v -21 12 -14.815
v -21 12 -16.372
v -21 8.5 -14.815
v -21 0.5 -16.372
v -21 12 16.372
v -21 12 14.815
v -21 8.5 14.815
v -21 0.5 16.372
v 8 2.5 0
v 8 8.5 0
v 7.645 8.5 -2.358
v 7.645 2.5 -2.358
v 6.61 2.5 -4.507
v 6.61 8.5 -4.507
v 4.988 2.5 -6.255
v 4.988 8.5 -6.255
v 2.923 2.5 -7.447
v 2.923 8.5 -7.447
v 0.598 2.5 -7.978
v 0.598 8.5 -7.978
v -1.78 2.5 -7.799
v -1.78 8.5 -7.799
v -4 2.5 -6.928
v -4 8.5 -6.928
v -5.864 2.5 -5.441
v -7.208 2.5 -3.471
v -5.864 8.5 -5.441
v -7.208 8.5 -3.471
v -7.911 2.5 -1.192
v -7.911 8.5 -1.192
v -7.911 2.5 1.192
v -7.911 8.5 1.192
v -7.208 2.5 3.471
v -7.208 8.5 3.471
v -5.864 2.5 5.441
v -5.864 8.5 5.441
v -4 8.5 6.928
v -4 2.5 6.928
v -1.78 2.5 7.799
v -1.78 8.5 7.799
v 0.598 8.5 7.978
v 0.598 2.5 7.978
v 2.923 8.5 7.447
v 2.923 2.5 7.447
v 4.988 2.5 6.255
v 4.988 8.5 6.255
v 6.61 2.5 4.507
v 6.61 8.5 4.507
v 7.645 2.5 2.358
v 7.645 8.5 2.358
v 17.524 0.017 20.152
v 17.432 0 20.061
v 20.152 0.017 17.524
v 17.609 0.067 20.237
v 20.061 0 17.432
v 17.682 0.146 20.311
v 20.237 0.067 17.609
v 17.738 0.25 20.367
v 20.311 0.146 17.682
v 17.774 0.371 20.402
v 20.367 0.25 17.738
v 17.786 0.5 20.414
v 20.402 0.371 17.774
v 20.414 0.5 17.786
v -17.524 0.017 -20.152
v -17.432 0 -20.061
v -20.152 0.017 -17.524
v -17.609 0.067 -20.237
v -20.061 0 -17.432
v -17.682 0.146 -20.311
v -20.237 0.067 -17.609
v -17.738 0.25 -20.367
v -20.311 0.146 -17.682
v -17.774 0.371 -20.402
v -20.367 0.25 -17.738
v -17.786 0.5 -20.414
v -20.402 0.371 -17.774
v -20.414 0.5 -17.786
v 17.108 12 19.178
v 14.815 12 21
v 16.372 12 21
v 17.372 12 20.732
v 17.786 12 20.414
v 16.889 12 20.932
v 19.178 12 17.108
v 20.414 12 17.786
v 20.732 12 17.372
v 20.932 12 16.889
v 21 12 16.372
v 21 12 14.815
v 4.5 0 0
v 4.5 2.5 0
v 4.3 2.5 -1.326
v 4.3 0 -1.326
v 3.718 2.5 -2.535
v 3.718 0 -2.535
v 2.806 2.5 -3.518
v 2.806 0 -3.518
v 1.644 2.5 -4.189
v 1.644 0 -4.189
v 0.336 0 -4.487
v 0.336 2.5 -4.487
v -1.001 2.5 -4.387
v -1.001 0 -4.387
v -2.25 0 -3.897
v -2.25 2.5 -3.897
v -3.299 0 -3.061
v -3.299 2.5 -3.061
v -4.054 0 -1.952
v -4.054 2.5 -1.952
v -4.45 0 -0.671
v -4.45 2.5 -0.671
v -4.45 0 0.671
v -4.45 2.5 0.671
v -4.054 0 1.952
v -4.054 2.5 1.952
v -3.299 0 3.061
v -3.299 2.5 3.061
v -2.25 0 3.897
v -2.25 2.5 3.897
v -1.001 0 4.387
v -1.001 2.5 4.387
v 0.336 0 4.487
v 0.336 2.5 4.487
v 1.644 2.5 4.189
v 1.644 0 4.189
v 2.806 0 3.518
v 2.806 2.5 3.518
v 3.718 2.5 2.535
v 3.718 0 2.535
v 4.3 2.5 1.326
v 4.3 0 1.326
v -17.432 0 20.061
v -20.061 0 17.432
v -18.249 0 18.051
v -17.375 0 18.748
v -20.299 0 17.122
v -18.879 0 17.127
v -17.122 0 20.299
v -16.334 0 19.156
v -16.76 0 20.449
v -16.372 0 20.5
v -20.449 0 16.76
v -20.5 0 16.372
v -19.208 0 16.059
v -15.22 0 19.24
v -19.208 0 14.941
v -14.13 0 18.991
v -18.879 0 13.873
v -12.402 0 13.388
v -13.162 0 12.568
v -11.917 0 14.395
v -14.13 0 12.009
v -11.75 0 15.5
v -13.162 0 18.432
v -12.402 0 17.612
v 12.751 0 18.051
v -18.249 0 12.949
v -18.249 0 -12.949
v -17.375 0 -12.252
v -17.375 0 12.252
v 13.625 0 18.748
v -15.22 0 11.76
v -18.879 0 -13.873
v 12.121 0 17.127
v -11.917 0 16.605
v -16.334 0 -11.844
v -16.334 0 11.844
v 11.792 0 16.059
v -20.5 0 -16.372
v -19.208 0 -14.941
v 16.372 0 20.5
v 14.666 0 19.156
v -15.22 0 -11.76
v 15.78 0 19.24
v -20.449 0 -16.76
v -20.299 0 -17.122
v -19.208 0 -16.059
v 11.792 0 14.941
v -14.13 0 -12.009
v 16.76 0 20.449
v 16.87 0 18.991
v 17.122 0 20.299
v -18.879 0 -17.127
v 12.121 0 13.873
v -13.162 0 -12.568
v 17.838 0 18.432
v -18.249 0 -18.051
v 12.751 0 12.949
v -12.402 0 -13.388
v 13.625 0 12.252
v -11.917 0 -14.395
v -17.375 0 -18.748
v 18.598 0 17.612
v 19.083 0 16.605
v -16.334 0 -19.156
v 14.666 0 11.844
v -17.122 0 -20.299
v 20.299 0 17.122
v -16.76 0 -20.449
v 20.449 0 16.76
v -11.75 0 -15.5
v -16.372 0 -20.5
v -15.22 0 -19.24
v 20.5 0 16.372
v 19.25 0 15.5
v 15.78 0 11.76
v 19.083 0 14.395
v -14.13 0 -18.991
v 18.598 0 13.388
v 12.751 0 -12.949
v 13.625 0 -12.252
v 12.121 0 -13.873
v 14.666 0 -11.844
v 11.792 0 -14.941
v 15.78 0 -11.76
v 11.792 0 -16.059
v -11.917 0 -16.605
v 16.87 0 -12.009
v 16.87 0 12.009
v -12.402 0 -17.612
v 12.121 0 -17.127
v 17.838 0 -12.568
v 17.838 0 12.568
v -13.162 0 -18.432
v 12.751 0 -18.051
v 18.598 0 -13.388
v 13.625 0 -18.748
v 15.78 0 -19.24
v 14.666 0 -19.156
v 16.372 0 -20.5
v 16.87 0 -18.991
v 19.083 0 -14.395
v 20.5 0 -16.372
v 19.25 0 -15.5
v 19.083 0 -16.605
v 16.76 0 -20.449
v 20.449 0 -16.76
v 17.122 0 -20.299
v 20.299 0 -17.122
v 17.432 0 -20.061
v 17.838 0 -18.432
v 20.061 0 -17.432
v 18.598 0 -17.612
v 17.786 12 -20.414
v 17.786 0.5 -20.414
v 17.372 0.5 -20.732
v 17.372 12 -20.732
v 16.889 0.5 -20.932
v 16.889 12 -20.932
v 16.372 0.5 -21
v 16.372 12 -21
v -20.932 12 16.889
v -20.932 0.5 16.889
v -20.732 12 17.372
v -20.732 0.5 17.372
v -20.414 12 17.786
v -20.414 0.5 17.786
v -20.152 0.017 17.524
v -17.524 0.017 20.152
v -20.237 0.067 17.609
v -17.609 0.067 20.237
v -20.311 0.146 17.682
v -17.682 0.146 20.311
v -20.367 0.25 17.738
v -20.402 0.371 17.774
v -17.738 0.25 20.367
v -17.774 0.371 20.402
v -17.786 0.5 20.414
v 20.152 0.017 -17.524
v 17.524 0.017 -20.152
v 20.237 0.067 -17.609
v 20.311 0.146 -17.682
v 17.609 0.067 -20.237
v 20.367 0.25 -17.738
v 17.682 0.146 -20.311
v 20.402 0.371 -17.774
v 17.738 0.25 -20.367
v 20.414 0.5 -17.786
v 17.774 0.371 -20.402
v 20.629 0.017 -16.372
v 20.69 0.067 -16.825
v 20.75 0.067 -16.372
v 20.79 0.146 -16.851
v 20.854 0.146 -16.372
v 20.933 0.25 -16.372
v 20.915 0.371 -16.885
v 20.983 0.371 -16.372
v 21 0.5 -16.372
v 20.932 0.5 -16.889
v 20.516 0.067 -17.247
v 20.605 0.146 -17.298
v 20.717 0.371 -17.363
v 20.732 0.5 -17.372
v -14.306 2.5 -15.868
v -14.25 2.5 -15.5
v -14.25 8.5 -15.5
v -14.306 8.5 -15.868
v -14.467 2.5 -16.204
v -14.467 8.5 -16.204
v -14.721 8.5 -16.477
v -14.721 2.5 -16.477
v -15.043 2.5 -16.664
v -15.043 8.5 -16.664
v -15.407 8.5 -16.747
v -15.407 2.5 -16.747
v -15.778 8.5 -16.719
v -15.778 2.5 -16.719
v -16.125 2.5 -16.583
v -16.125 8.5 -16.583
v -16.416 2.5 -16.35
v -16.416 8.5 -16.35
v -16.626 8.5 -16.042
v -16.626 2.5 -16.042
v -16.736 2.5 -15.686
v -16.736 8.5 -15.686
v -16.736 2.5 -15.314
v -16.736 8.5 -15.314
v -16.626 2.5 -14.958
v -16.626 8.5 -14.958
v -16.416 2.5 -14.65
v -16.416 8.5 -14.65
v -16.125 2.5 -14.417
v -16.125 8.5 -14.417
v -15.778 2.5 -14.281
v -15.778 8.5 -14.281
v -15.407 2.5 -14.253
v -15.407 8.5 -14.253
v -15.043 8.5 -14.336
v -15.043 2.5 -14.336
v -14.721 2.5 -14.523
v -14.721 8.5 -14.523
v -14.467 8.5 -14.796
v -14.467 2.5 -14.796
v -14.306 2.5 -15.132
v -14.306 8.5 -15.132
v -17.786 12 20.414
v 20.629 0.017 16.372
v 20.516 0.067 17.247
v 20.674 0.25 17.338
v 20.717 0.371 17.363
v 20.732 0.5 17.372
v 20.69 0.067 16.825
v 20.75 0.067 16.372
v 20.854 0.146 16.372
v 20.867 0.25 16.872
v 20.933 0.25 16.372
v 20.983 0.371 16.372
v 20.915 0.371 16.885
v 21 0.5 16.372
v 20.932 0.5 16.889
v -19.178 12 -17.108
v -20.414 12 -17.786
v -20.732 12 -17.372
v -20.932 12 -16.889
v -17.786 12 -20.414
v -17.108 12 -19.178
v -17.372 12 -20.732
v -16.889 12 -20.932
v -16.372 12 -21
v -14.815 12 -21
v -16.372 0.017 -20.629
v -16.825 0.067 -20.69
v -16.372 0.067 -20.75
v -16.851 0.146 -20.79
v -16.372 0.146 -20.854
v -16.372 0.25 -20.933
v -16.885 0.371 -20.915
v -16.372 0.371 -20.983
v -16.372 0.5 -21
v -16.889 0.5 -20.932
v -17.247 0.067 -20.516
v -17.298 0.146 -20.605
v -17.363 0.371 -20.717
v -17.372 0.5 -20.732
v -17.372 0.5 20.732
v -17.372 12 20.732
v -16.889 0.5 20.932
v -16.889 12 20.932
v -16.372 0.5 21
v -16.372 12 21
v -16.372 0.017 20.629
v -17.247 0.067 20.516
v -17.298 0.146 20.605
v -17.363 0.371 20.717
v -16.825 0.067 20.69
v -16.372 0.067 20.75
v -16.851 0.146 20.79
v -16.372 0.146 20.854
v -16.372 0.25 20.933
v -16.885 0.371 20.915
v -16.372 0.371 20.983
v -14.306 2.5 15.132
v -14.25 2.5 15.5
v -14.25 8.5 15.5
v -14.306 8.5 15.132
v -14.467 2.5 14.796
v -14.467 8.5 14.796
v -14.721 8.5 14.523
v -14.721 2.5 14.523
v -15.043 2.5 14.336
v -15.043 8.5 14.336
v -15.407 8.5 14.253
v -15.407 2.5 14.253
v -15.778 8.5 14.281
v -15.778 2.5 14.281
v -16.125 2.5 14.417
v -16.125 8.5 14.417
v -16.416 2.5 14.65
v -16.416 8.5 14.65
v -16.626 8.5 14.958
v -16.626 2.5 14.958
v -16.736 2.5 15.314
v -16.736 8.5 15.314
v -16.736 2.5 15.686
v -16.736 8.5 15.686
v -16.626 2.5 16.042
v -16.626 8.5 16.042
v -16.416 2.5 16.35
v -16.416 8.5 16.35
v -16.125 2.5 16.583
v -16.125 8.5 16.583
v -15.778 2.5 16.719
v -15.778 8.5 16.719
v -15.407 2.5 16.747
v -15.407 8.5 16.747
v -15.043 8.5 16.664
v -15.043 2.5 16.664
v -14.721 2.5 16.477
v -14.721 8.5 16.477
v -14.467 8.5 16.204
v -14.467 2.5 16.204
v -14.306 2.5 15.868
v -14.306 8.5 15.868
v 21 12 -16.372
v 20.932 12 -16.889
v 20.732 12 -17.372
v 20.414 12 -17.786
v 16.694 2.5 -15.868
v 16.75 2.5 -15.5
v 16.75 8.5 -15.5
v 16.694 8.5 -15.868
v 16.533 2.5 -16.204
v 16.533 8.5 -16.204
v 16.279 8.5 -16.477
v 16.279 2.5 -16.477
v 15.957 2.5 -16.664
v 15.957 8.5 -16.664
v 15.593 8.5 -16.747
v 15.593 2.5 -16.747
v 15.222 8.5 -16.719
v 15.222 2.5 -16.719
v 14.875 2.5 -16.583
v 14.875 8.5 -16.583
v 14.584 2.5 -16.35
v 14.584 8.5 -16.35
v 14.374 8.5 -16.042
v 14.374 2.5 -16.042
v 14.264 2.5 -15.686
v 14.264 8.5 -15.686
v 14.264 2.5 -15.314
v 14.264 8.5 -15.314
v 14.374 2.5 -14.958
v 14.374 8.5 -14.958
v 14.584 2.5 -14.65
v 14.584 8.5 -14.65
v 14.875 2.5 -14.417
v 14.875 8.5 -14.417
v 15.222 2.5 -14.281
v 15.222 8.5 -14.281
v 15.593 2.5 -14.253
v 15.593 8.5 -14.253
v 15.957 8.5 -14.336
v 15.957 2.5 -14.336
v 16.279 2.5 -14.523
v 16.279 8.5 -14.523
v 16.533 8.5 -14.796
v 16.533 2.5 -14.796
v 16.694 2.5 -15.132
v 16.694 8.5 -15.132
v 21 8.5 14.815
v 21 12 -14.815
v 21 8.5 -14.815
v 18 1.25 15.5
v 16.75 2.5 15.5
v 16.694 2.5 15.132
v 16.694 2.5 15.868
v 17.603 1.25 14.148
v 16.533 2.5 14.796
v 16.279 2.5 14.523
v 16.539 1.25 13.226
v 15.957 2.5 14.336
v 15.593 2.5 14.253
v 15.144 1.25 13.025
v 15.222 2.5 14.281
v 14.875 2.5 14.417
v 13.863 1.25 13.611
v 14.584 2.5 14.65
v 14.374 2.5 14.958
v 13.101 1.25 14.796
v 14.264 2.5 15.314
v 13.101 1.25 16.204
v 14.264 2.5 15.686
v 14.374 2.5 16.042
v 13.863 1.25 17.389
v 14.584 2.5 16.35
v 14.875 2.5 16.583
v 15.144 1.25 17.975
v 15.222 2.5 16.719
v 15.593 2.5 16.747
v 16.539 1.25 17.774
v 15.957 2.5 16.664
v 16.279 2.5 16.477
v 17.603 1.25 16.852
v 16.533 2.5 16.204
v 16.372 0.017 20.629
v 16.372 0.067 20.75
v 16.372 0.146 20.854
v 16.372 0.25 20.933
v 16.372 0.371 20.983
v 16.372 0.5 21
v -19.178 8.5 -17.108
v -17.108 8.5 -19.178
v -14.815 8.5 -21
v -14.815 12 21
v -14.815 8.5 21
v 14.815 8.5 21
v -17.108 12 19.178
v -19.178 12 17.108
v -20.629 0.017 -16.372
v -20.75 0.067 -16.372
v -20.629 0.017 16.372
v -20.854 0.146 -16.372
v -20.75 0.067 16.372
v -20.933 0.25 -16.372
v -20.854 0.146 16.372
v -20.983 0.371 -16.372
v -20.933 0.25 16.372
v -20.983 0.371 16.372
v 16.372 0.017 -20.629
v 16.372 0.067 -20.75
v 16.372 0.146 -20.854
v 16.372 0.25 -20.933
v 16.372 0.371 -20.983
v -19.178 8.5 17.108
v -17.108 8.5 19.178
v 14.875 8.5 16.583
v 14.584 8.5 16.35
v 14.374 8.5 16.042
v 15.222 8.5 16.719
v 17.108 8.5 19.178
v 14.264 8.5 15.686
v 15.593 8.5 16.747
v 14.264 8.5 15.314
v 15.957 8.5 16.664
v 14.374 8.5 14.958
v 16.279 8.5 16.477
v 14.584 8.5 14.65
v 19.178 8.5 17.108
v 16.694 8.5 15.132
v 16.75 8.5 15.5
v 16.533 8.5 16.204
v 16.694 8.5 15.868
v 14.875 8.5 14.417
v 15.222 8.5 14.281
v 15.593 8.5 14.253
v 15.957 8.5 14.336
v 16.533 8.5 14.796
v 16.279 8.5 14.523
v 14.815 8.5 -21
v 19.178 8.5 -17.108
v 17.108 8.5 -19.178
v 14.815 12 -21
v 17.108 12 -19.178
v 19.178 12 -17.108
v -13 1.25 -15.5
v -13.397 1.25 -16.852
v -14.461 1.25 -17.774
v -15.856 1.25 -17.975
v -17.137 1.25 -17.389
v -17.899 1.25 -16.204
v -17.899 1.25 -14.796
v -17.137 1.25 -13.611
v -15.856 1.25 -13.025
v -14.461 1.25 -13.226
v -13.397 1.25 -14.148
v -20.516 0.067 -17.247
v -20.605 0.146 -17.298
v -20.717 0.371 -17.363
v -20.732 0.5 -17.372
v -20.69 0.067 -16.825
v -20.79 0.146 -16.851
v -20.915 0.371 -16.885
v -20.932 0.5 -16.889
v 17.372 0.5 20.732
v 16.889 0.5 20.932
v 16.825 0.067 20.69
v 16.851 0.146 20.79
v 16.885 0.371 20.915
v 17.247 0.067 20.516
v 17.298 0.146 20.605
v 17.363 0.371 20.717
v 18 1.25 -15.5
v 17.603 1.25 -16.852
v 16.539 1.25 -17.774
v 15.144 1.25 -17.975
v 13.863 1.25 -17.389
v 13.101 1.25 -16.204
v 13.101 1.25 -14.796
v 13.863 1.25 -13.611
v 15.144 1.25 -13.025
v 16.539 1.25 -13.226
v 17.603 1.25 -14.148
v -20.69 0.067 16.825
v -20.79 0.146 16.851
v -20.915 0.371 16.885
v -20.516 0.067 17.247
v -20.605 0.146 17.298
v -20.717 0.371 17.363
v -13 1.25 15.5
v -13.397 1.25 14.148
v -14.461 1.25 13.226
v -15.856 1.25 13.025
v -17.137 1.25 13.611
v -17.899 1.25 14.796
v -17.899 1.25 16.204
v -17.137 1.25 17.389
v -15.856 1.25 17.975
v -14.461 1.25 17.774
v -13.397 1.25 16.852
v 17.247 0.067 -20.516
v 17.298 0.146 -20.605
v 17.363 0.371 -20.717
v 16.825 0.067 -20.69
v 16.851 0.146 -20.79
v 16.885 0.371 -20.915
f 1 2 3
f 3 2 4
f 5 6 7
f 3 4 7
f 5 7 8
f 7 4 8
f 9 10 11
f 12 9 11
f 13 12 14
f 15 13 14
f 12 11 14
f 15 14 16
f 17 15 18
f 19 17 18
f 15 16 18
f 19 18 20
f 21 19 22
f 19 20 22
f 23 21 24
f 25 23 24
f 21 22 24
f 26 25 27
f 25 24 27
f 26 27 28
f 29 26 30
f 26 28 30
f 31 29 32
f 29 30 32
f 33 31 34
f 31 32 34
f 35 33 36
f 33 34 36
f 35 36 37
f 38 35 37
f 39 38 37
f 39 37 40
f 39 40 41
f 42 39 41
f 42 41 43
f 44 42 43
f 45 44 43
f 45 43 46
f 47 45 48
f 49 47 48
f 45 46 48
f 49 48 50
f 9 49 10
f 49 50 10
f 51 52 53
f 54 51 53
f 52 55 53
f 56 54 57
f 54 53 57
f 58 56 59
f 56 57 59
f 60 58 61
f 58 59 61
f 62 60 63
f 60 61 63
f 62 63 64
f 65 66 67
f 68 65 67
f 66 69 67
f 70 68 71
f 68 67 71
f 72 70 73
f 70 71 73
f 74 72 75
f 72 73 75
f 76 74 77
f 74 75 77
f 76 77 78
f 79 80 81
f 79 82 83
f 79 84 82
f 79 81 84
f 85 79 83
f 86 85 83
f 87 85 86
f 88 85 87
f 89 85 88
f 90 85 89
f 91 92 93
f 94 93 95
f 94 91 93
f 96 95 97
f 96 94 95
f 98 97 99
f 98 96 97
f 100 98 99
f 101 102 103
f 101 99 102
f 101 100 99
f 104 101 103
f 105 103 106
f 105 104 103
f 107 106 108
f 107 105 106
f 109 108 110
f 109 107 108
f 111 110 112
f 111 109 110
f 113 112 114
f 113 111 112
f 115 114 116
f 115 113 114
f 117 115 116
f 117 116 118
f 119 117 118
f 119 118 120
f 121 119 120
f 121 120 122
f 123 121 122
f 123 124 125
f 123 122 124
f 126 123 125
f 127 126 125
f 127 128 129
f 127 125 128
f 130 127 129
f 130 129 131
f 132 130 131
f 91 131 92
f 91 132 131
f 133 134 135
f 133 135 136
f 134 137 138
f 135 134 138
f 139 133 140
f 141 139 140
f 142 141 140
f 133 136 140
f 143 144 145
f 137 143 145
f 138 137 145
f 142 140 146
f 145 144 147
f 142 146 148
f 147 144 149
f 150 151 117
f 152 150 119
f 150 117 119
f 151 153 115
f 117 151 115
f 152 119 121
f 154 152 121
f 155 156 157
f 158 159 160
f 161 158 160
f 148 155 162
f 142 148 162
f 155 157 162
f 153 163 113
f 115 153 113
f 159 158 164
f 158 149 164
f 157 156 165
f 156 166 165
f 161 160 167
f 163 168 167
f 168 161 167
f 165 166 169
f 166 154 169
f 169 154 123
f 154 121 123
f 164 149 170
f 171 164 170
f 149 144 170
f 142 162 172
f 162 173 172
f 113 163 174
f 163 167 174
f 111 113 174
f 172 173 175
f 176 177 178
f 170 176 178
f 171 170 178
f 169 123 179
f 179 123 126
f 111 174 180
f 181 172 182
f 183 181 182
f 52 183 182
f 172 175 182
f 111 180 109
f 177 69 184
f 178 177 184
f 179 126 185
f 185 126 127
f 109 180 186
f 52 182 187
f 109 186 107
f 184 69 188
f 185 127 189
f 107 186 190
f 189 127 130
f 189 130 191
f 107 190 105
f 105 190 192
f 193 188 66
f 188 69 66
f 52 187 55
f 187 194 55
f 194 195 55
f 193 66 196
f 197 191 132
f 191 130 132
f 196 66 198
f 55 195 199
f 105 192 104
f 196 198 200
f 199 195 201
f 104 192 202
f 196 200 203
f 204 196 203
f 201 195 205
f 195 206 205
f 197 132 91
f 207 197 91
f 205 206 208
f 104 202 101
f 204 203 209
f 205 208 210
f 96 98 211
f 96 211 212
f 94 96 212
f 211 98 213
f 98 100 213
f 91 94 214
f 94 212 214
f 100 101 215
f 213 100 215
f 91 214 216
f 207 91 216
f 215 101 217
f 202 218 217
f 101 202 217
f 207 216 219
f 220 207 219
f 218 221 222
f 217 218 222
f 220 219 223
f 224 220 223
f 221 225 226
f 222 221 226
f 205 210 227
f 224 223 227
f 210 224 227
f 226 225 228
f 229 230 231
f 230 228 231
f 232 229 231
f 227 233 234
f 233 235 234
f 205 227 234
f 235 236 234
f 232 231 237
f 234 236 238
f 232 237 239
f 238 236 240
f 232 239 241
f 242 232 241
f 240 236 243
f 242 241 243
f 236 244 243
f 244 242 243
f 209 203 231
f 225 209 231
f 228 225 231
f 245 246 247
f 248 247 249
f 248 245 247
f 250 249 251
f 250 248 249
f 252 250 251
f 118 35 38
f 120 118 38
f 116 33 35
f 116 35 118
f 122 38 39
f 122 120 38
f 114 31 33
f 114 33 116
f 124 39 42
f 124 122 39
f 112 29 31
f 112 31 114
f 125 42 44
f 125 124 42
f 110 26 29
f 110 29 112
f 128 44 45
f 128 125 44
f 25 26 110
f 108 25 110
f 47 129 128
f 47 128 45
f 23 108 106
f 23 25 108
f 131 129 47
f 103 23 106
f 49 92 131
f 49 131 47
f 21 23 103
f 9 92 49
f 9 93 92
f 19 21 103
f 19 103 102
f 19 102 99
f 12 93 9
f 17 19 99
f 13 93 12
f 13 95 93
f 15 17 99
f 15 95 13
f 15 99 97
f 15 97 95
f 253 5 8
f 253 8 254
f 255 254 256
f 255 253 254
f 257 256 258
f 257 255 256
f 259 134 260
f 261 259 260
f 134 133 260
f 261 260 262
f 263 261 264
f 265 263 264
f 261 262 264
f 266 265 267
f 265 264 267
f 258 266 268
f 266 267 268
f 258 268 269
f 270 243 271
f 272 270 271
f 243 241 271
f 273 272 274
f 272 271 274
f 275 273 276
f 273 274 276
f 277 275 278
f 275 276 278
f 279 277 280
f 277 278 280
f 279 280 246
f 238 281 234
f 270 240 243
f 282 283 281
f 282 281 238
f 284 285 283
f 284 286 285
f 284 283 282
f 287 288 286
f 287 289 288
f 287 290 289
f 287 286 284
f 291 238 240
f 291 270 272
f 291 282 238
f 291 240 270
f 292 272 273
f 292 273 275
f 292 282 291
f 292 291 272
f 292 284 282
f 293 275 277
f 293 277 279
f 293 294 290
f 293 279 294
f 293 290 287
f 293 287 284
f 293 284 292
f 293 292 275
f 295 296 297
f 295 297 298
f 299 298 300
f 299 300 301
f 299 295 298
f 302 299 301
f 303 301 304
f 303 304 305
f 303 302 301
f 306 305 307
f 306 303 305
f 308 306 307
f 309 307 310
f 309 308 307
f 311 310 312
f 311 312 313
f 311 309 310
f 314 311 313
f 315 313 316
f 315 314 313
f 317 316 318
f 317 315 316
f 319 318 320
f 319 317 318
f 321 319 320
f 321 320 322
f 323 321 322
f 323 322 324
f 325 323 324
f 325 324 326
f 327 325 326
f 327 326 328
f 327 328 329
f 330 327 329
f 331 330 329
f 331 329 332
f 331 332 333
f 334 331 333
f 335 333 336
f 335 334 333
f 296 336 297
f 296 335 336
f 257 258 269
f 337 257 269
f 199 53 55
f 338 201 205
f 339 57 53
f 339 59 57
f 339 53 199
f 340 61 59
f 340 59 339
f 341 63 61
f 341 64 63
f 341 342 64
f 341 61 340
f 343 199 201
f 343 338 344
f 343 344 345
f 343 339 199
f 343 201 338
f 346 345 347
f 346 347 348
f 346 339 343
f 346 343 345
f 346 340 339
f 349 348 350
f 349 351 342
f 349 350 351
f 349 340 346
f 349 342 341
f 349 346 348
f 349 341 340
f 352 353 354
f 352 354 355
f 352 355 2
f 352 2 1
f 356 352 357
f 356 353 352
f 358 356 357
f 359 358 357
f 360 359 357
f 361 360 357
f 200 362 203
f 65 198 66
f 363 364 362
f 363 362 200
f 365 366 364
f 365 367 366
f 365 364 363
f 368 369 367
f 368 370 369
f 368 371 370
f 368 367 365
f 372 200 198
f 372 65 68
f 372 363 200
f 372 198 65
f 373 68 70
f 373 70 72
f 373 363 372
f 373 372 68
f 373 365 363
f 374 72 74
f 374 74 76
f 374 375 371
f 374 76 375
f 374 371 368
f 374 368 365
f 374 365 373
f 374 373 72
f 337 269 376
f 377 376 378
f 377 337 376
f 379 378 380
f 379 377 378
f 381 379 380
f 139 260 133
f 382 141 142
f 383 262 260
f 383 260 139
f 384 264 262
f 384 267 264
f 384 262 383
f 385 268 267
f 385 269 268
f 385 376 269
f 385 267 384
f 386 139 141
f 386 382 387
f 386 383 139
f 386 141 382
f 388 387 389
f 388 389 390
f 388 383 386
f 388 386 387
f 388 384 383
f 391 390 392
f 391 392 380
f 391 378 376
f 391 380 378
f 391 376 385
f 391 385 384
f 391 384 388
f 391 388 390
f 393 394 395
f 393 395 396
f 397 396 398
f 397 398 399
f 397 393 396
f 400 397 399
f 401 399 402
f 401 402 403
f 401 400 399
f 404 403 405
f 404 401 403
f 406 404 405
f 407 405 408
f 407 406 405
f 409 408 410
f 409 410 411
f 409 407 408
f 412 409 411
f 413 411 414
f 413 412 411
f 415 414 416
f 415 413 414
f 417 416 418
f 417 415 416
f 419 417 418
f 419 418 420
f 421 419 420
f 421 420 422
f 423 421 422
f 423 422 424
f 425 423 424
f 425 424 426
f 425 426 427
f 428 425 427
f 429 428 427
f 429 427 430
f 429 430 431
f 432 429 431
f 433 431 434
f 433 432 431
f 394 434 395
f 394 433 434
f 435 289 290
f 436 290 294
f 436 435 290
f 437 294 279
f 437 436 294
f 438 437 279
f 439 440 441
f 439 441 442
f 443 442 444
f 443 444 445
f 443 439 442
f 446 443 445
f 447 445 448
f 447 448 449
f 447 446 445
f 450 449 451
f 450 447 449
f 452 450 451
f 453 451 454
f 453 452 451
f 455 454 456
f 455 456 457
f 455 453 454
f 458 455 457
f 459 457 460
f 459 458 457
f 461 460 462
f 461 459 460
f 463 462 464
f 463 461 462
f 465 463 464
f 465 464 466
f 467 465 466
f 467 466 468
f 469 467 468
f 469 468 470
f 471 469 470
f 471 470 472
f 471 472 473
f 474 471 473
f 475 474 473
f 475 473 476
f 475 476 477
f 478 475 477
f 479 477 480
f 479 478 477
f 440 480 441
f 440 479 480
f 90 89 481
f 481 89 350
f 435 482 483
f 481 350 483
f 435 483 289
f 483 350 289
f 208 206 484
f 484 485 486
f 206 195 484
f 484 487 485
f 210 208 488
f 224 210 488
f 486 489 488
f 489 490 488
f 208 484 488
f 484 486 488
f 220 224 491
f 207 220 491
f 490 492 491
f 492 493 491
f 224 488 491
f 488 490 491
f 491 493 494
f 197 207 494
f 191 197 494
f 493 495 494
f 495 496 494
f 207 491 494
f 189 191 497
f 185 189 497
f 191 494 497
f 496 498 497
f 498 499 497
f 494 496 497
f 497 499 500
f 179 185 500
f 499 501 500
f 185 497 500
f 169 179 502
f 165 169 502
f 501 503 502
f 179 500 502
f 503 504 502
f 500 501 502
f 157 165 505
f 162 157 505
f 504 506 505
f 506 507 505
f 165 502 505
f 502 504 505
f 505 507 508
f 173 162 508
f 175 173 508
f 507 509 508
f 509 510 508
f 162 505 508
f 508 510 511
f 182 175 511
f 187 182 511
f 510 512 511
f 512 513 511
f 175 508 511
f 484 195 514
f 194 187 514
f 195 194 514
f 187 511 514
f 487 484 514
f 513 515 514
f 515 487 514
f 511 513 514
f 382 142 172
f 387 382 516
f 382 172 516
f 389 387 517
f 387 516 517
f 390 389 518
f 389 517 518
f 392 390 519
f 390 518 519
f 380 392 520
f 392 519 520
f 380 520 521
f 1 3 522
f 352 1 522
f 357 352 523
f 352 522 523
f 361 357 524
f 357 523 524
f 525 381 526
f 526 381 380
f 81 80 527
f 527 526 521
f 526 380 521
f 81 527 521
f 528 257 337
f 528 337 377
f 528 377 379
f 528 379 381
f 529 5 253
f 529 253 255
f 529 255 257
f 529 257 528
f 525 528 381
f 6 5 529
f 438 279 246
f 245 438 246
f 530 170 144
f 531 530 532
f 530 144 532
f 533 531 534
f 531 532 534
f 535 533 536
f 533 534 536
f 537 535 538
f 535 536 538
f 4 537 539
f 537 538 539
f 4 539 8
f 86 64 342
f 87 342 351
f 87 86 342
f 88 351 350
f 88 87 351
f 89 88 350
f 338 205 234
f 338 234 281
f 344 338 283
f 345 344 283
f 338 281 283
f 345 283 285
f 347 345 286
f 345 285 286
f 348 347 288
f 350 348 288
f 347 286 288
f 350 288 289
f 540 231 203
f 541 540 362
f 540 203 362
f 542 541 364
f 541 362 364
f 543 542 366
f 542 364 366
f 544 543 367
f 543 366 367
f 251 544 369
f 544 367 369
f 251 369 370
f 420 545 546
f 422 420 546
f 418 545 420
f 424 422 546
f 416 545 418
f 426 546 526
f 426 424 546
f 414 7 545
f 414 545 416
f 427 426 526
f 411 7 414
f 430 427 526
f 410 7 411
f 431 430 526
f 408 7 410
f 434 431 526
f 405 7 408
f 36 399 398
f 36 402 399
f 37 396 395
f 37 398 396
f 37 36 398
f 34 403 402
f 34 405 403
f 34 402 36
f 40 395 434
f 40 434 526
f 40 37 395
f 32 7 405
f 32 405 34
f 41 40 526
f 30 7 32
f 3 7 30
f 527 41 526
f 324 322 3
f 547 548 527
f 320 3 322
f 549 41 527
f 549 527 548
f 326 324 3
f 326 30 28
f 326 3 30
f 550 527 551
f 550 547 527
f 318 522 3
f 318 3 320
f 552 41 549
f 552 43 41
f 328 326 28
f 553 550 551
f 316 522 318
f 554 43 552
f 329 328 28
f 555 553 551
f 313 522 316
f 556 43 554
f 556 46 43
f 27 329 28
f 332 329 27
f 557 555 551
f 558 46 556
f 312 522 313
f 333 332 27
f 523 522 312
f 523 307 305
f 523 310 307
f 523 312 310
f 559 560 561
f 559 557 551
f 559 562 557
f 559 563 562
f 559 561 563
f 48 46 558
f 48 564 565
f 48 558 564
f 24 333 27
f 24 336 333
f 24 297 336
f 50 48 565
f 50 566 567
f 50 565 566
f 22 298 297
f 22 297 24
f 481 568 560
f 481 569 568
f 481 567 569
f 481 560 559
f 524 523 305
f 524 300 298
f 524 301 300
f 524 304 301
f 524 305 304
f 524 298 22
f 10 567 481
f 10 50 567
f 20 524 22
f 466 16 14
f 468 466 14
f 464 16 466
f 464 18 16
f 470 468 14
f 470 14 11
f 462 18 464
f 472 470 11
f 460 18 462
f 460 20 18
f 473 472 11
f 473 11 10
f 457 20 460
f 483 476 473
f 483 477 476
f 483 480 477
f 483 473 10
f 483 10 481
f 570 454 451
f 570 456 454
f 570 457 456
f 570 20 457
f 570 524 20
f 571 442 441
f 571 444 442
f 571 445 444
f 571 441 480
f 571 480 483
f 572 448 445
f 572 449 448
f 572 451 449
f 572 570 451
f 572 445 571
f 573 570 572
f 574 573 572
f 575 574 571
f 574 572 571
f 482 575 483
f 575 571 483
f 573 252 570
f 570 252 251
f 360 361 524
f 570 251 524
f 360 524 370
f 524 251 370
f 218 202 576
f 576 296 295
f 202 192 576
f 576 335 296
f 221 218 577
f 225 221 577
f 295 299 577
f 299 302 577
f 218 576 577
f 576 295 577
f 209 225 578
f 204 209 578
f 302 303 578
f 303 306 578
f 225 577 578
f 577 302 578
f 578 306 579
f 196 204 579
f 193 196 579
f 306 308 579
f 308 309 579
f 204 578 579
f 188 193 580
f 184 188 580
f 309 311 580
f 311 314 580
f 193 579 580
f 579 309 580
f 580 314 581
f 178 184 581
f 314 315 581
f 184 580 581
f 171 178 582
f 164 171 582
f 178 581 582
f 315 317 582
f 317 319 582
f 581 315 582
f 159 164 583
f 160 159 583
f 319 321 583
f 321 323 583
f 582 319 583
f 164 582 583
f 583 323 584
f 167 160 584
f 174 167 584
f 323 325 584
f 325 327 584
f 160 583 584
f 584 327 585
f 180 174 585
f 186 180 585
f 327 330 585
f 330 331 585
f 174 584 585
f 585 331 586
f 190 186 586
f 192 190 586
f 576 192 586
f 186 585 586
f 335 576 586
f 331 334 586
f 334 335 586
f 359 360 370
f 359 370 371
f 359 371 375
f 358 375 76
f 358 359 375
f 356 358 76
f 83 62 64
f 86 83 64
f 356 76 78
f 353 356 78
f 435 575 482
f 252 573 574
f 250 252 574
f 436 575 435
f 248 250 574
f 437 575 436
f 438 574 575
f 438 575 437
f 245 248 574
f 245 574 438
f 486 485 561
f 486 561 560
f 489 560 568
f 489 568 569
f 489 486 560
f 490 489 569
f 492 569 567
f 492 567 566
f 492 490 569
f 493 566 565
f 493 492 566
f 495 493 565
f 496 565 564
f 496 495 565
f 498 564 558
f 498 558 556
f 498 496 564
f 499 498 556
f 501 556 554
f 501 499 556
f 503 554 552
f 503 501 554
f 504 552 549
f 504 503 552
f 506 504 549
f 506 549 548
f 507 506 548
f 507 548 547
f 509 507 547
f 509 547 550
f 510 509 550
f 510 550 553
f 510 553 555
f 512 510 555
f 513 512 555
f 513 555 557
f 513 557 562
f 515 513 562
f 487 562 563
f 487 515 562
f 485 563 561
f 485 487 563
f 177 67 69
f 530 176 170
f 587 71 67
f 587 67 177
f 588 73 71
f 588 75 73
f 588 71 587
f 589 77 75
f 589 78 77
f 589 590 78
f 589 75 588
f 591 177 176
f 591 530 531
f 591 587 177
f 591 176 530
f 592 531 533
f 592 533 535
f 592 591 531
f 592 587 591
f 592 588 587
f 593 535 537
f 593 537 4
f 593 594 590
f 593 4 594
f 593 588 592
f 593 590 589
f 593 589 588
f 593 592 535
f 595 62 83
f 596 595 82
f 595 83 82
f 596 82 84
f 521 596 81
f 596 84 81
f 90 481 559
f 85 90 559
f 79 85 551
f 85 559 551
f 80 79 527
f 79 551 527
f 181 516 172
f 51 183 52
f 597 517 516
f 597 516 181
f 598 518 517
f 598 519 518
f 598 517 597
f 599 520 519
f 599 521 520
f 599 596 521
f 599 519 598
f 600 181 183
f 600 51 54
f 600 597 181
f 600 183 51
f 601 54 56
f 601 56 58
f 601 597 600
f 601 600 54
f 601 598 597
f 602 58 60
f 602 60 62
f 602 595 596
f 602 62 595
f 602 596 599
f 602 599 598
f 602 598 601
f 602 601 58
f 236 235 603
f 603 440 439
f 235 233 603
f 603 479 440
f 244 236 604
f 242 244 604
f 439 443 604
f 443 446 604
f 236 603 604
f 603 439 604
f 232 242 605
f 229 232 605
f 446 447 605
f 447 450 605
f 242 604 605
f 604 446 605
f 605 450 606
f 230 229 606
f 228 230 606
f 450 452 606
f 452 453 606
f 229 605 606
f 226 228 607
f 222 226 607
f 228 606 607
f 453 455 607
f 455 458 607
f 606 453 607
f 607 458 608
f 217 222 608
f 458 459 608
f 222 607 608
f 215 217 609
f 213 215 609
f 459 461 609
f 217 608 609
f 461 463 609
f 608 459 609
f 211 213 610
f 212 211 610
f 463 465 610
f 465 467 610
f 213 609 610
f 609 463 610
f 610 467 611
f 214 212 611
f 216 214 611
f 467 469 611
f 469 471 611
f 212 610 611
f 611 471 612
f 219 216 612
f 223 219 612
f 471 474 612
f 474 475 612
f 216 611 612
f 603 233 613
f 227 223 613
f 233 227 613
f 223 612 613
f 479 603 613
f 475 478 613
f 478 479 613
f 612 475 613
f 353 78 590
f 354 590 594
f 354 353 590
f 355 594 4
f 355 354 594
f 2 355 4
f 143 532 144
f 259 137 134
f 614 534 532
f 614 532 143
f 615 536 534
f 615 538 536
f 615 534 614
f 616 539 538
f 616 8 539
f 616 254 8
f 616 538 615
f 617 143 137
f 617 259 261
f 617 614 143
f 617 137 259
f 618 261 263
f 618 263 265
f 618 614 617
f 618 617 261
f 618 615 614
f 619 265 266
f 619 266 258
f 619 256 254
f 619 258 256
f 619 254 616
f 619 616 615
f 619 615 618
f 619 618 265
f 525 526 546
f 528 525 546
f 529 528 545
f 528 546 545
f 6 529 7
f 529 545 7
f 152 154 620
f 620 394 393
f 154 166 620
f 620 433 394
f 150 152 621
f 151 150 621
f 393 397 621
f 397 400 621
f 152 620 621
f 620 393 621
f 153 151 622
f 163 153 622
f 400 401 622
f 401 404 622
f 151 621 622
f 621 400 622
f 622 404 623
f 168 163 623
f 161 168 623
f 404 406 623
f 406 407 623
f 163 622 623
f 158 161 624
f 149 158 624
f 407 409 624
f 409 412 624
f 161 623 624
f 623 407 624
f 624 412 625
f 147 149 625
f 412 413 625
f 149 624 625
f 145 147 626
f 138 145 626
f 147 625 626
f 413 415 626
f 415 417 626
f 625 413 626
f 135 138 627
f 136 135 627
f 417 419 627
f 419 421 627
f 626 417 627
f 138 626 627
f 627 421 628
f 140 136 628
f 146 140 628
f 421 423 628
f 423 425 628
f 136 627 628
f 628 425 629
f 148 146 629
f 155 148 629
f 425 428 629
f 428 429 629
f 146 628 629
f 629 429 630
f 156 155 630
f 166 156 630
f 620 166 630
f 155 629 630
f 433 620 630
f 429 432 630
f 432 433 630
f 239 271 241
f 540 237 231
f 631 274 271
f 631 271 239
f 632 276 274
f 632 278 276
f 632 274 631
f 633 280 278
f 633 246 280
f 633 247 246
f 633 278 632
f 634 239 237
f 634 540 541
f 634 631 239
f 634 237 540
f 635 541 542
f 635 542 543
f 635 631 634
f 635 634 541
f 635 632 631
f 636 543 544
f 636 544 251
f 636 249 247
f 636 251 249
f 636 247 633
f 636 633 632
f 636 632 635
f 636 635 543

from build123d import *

# Parameters (mm, degrees)
SKETCH_1_R          = 1.25
SKETCH_1_R_2        = 4.5
EXTRUDE_1_DEPTH     = 8.5
EXTRUDE_2_DEPTH     = 12
CHAMFER_1_SIZE      = 2.5
SKETCH_2_R          = 8
CUT_EXTRUDE_1_DEPTH = 6
FILLET_1_R          = 2
FILLET_2_R          = 0.5


with BuildPart() as part:
    # Эскиз1 → Бобышка-Вытянуть1 (new body)
    with BuildSketch(Plane(origin=(0, 0, 0), x_dir=(1, 0, 0), z_dir=(0, 1, 0))):
        with BuildLine():
            ThreePointArc((-14.815194903, 21), (-18.172644276, 18.172644276), (-21, 14.815194903))
            Line((-21, 14.815194903), (-21, -14.815194903))
            ThreePointArc((-21, -14.815194903), (-18.172644276, -18.172644276), (-14.815194903, -21))
            Line((-14.815194903, -21), (14.815194903, -21))
            ThreePointArc((14.815194903, -21), (18.172644276, -18.172644276), (21, -14.815194903))
            Line((21, -14.815194903), (21, 14.815194903))
            ThreePointArc((21, 14.815194903), (18.172644276, 18.172644276), (14.815194903, 21))
            Line((14.815194903, 21), (-14.815194903, 21))
        make_face()
        with Locations((-15.5, -15.5)):
            Circle(SKETCH_1_R, mode=Mode.SUBTRACT)
        with Locations((15.5, -15.5)):
            Circle(SKETCH_1_R, mode=Mode.SUBTRACT)
        with Locations((-15.5, 15.5)):
            Circle(SKETCH_1_R, mode=Mode.SUBTRACT)
        with Locations((15.5, 15.5)):
            Circle(SKETCH_1_R, mode=Mode.SUBTRACT)
        Circle(SKETCH_1_R_2, mode=Mode.SUBTRACT)
    extrude(amount=EXTRUDE_1_DEPTH)

    # Эскиз1<4> → Бобышка-Вытянуть2 (add)
    with BuildSketch(Plane(origin=(0, 0, 0), x_dir=(1, 0, 0), z_dir=(0, 1, 0))):
        with BuildLine():
            Line((-17.2, 21), (-21, 17.2))
            Line((-21, 17.2), (-21, 14.815194903))
            ThreePointArc((-21, 14.815194903), (-18.172644276, 18.172644276), (-14.815194903, 21))
            Line((-14.815194903, 21), (-17.2, 21))
        make_face()
        with BuildLine():
            ThreePointArc((-14.815194903, -21), (-18.172644276, -18.172644276), (-21, -14.815194903))
            Line((-21, -14.815194903), (-21, -17.2))
            Line((-21, -17.2), (-17.2, -21))
            Line((-17.2, -21), (-14.815194903, -21))
        make_face()
        with BuildLine():
            Line((17.2, 21), (14.815194903, 21))
            ThreePointArc((14.815194903, 21), (18.172644276, 18.172644276), (21, 14.815194903))
            Line((21, 14.815194903), (21, 17.2))
            Line((21, 17.2), (17.2, 21))
        make_face()
        with BuildLine():
            ThreePointArc((21, -14.815194903), (18.172644276, -18.172644276), (14.815194903, -21))
            Line((14.815194903, -21), (17.2, -21))
            Line((17.2, -21), (21, -17.2))
            Line((21, -17.2), (21, -14.815194903))
        make_face()
    extrude(amount=EXTRUDE_2_DEPTH)

    # Фаска1
    chamfer_1_edges = [part.edges().sort_by_distance(p)[0] for p in [
        (-16.75, 0, -15.5),
        (14.25, 0, -15.5),
        (14.25, 0, 15.5),
        (-16.75, 0, 15.5),
    ]]
    chamfer(chamfer_1_edges, length=CHAMFER_1_SIZE)

    # Эскиз2 → Вырез-Вытянуть1 (cut)
    with BuildSketch(Plane(origin=(0, 8.5, 0), x_dir=(1, 0, 0), z_dir=(0, 1, 0))):
        Circle(SKETCH_2_R)
    extrude(amount=-CUT_EXTRUDE_1_DEPTH, mode=Mode.SUBTRACT)

    # Скругление1
    fillet_1_edges = [part.edges().sort_by_distance(p)[0] for p in [
        (21, 6, 17.2),
        (17.2, 6, 21),
        (-17.2, 6, 21),
        (-21, 6, 17.2),
        (-21, 6, -17.2),
        (-17.2, 6, -21),
        (17.2, 6, -21),
        (21, 6, -17.2),
    ]]
    fillet(fillet_1_edges, radius=FILLET_1_R)

    # Скругление2
    fillet_2_edges = [part.edges().sort_by_distance(p)[0] for p in [
        (-17.13693974, 0, 20.847759065),
        (-19.1, 0, 19.1),
        (-20.847759065, 0, 17.13693974),
        (-21, 0, 0),
        (-20.847759065, 0, -17.13693974),
        (-19.1, 0, -19.1),
        (-17.13693974, 0, -20.847759065),
        (0, 0, -21),
        (17.13693974, 0, -20.847759065),
        (19.1, 0, -19.1),
        (20.847759065, 0, -17.13693974),
        (21, 0, 0),
        (20.847759065, 0, 17.13693974),
        (19.1, 0, 19.1),
        (17.13693974, 0, 20.847759065),
        (0, 0, 21),
    ]]
    fillet(fillet_2_edges, radius=FILLET_2_R)


solid = part.part
